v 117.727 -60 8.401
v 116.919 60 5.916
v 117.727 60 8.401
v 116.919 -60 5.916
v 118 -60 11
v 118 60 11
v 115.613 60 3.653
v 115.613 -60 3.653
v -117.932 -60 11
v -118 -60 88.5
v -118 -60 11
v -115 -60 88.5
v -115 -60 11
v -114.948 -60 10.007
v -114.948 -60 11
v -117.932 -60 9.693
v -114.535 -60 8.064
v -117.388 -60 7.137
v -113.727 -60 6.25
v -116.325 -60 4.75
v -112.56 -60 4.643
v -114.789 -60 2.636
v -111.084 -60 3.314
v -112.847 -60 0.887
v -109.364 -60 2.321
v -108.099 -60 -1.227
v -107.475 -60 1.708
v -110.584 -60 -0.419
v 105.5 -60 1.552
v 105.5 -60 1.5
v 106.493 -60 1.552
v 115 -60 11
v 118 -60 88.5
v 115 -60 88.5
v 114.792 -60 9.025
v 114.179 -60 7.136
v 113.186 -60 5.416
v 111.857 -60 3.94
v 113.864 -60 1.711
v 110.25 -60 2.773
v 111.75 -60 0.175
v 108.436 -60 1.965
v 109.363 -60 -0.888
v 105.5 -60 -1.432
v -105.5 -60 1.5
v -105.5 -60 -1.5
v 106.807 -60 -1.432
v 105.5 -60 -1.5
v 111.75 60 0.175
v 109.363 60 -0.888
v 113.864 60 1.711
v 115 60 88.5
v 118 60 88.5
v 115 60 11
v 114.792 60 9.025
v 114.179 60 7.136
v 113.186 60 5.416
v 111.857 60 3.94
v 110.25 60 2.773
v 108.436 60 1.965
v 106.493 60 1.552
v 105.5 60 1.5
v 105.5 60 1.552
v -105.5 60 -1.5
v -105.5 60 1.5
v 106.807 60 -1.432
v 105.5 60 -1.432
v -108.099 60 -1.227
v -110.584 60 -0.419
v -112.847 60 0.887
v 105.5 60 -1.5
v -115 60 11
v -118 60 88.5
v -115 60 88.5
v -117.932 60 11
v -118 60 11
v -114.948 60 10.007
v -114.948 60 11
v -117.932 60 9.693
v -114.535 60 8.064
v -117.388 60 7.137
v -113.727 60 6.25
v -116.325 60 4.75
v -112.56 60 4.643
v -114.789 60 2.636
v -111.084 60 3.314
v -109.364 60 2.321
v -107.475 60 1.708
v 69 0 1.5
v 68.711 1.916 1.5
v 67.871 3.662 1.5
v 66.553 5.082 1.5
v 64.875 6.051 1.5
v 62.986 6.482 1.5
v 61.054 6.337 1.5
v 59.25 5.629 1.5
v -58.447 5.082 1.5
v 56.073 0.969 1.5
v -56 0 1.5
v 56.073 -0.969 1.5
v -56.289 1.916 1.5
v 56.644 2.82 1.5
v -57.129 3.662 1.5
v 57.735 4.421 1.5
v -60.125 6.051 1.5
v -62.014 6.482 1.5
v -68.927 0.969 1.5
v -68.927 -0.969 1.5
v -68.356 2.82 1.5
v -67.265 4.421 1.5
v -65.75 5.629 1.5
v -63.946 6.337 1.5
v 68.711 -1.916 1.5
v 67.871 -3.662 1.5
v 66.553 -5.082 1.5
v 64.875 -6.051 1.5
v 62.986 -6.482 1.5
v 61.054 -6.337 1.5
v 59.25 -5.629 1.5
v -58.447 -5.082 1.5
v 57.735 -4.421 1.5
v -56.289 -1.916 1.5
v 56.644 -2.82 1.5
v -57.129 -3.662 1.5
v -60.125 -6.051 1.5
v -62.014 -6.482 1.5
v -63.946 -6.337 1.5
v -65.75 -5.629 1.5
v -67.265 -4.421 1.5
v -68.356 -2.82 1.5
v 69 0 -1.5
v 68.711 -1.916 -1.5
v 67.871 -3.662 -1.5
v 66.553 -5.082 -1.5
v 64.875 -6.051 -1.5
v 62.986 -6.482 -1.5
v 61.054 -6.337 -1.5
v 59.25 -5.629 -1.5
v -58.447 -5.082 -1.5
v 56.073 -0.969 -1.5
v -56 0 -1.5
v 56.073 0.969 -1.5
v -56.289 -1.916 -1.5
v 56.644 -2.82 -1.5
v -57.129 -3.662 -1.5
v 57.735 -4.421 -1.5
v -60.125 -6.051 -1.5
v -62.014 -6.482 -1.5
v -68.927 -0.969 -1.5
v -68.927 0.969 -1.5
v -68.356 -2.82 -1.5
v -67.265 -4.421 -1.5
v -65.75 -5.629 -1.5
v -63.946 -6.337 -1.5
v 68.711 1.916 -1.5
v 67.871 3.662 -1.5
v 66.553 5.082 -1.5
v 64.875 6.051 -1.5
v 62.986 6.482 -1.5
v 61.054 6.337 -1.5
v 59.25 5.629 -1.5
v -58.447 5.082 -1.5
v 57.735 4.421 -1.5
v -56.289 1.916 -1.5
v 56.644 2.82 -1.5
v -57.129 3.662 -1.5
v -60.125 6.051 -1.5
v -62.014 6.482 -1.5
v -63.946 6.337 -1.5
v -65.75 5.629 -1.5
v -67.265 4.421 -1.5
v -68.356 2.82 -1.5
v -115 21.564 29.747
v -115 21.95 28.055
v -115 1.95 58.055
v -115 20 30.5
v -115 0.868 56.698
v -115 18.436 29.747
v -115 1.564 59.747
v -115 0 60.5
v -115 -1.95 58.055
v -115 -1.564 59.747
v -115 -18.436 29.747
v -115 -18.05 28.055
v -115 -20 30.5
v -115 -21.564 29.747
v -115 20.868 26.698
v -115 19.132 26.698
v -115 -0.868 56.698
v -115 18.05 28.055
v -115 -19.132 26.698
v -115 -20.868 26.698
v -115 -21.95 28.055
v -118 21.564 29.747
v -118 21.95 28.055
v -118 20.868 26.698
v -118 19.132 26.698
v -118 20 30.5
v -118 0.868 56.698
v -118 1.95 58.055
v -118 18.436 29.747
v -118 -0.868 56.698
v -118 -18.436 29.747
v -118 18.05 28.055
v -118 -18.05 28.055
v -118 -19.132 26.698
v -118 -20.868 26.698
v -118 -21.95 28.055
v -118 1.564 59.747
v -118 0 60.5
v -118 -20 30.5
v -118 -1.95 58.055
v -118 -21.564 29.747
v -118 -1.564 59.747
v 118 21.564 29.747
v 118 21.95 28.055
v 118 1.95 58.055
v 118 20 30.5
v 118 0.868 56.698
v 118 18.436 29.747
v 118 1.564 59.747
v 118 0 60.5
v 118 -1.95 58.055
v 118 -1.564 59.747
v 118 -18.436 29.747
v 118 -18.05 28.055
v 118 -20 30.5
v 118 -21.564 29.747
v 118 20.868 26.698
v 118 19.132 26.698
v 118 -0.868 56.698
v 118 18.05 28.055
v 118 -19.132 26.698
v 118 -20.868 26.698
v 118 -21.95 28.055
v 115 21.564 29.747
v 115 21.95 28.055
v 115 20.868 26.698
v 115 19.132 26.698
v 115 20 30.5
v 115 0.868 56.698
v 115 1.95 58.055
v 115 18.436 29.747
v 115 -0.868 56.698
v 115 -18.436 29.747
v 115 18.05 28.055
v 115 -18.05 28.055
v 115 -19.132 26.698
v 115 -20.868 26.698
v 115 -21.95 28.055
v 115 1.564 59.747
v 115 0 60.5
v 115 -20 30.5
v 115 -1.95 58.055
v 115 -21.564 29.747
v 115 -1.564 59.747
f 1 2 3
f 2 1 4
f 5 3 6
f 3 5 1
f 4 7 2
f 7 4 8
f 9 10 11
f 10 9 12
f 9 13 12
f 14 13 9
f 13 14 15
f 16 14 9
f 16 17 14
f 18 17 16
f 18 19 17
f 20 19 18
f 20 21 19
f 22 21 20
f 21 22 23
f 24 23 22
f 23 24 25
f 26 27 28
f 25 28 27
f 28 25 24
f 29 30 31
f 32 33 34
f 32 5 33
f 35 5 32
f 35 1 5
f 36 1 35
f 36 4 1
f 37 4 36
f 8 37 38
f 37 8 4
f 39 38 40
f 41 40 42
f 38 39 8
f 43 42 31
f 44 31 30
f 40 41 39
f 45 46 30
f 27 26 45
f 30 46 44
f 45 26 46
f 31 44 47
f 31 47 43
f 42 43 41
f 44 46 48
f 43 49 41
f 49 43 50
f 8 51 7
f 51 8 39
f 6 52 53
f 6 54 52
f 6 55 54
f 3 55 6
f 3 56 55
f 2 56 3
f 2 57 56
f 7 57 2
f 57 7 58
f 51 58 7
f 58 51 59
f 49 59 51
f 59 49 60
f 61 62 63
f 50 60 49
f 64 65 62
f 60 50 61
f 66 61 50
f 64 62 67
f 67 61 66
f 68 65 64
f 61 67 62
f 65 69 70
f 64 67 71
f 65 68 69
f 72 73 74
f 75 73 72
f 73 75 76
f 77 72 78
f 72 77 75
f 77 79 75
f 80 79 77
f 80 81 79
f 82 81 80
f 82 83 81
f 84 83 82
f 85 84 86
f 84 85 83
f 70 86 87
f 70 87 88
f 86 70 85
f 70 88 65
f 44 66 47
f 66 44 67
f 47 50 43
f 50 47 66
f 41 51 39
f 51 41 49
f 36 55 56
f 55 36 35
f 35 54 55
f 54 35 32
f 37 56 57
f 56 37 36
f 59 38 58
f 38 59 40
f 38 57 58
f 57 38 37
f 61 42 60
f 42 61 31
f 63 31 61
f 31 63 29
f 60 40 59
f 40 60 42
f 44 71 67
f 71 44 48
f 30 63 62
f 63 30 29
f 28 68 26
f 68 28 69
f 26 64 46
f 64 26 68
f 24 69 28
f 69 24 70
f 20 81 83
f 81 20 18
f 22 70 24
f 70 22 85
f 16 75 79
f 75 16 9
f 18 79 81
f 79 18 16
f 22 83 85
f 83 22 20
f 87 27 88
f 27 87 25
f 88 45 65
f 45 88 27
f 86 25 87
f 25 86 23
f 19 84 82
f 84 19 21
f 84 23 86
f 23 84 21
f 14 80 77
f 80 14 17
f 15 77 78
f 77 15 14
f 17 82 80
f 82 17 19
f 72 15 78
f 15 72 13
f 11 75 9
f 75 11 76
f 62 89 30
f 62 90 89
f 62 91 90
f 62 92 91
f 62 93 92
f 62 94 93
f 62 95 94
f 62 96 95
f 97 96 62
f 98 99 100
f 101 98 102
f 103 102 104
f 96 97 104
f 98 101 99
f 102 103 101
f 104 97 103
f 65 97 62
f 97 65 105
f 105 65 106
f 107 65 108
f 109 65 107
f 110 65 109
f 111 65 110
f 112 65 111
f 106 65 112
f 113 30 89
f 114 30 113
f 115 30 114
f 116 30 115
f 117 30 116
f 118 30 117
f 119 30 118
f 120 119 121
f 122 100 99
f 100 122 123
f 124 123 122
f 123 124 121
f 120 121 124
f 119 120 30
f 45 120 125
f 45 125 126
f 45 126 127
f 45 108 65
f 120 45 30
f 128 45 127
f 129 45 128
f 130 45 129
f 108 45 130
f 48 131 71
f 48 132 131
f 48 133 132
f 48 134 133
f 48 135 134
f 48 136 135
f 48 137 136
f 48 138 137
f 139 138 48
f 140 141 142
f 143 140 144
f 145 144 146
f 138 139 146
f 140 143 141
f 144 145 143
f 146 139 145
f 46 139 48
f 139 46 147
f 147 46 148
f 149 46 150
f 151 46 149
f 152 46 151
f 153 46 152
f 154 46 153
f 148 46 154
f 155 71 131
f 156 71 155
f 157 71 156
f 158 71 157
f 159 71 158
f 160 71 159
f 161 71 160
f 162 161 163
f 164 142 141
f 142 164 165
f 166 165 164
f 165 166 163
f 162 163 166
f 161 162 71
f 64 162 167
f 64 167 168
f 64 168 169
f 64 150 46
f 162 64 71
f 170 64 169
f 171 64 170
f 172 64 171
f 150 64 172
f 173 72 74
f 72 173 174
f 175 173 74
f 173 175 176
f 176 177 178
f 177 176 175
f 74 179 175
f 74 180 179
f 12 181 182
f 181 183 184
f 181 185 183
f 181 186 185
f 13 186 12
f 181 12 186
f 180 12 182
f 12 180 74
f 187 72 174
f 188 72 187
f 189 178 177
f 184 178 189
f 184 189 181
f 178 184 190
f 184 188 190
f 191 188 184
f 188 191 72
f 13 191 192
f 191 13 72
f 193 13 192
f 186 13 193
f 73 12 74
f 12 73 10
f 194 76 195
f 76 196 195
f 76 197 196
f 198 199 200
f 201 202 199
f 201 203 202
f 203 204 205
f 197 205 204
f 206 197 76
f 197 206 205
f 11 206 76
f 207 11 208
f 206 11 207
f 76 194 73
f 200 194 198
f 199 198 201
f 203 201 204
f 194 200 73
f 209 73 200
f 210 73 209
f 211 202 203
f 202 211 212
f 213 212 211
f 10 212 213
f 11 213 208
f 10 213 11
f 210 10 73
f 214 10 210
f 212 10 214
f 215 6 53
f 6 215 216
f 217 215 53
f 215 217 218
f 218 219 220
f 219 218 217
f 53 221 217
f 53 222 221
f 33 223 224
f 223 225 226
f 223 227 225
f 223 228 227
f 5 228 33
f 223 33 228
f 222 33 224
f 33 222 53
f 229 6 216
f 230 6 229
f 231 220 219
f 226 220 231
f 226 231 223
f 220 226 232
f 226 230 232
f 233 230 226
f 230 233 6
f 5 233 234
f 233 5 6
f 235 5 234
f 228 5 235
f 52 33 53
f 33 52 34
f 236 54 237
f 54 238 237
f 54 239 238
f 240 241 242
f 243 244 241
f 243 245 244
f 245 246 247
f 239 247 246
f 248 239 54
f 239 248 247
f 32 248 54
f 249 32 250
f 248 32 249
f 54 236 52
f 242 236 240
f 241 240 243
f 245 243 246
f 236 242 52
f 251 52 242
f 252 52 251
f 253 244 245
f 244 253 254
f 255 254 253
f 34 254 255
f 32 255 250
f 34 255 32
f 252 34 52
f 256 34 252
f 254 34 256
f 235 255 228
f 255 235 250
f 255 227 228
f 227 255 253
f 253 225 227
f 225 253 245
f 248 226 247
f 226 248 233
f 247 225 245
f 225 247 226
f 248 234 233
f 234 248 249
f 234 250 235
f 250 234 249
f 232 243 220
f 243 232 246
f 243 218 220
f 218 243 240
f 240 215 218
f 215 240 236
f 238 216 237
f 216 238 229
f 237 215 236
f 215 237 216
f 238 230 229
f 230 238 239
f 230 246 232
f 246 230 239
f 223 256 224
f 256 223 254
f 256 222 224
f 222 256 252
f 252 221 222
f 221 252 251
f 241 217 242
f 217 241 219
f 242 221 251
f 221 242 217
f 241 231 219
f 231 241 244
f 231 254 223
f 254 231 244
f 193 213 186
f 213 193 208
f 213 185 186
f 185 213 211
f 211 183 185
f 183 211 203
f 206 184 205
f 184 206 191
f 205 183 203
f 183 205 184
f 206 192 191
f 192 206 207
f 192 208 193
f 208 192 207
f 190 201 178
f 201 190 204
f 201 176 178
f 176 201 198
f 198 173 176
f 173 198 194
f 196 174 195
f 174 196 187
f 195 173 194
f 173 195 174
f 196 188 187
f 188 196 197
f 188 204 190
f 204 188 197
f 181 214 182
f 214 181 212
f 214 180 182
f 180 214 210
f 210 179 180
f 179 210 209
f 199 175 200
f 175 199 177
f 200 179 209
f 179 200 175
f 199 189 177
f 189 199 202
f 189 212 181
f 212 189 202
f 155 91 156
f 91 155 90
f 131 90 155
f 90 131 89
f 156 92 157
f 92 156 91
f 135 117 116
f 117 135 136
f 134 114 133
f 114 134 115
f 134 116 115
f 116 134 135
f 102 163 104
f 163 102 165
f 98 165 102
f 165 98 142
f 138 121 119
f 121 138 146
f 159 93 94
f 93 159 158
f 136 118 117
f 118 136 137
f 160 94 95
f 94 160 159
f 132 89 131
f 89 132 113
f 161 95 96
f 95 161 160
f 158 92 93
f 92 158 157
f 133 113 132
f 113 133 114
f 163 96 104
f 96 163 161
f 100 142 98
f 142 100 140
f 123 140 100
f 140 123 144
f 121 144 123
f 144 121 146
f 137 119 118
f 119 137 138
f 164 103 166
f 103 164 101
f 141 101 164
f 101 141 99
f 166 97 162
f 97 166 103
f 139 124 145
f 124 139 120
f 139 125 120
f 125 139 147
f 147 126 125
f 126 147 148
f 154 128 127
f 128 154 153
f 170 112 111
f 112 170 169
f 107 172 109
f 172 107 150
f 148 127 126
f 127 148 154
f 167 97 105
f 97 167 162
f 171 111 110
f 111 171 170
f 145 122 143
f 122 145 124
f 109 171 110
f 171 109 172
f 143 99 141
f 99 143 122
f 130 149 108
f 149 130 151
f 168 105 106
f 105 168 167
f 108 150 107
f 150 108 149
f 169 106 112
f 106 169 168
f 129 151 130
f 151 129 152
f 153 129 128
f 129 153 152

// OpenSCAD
/*
 * Written by Dermot Tynan, Kalopa Research.
 * GPLv2.
 *
 * All dimensions are in mm.
 */

plate_length = 236;
plate_width = 120;
plate_height = 90;
plate_thickness = 3;

bend_radius = 12.5;

keelbolt_sep = 125;
keelbolt_dia = 13;

mount_dia = 4;

/*
 * Curved edges...
 */
module plate_bend()
{
	intersection() {
		difference() {
			cylinder(r = bend_radius, h = plate_width, center = true);
			cylinder(r = bend_radius - plate_thickness, h = plate_width + 1, center = true);
		}
		translate([bend_radius/2, bend_radius/2, 0])
			cube([bend_radius, bend_radius, plate_width], center = true);
	}
}

/*
 * Mounting holes
 */
module mounting_holes()
{
	rotate(a = [90, -90, 90]) {
		translate([-plate_height/6, plate_width/6, 0])
			cylinder(r = mount_dia/2, h = plate_thickness + 1, center = true);
		translate([-plate_height/6, -plate_width/6, 0])
			cylinder(r = mount_dia/2, h = plate_thickness + 1, center = true);
		translate([plate_height/6, 0, 0])
			cylinder(r = mount_dia/2, h = plate_thickness + 1, center = true);
	}
}

/*
 * Actual keel plate with rounded corners.
 */
module base_plate()
{
	union() {
		cube([plate_length - bend_radius * 2, plate_width, plate_thickness], center = true);
		translate([-(plate_length - plate_thickness)/2, 0, (plate_height - plate_thickness + bend_radius)/2])
			cube([plate_thickness, plate_width, plate_height - bend_radius], center = true);
		translate([(plate_length - plate_thickness)/2, 0, (plate_height - plate_thickness + bend_radius)/2])
			cube([plate_thickness, plate_width, plate_height - bend_radius], center = true);
		translate([plate_length/2 - bend_radius, 0, bend_radius - plate_thickness/2])
			rotate(a = [-90, 0, 0])
				plate_bend();
		translate([-(plate_length/2 - bend_radius), 0, bend_radius - plate_thickness/2])
			rotate(a = [-90, 90, 0])
				plate_bend();
	}
}

/*
 * Actual keel plate with flat corners.
 */
module straight_plate()
{
	union() {
		cube([plate_length, plate_width, plate_thickness], center = true);
		translate([-(plate_length - plate_thickness)/2, 0, (plate_height - plate_thickness)/2])
			cube([plate_thickness, plate_width, plate_height], center = true);
		translate([(plate_length - plate_thickness)/2, 0, (plate_height - plate_thickness)/2])
			cube([plate_thickness, plate_width, plate_height], center = true);
	}
}

/*
 * Actual keel plate.
 */
module keel_plate()
{
	difference() {
		base_plate();
		/*
		 * Keel bolts...
		 */
		translate([keelbolt_sep/2, 0, 0])
			cylinder(r = keelbolt_dia/2, h = plate_thickness + 1, center = true);
		translate([-keelbolt_sep/2, 0, 0])
			cylinder(r = keelbolt_dia/2, h = plate_thickness + 1, center = true);
		/*
		 * Mounting holes...
		 */
		translate([(plate_length - plate_thickness)/2, 0, (plate_height - plate_thickness)/2])
			mounting_holes();
		translate([-(plate_length - plate_thickness)/2, 0, (plate_height - plate_thickness)/2])
			mounting_holes();
	}
}

if (0) {
	projection(cut = false) {
		union() {
			/* Plan view */
			translate([0, 0, -plate_thickness/2]) keel_plate();
			/* Front Profile view */
			translate([0, plate_width/1.5 + plate_height, -10]) rotate(a = [90, 0, 0]) keel_plate();
			/* Left Profile view */
			translate([plate_length/1.5, 0, (plate_length - plate_thickness)/2]) rotate(a = [0, 90, 0]) keel_plate();
		}
	}
} else {
	keel_plate();
}
